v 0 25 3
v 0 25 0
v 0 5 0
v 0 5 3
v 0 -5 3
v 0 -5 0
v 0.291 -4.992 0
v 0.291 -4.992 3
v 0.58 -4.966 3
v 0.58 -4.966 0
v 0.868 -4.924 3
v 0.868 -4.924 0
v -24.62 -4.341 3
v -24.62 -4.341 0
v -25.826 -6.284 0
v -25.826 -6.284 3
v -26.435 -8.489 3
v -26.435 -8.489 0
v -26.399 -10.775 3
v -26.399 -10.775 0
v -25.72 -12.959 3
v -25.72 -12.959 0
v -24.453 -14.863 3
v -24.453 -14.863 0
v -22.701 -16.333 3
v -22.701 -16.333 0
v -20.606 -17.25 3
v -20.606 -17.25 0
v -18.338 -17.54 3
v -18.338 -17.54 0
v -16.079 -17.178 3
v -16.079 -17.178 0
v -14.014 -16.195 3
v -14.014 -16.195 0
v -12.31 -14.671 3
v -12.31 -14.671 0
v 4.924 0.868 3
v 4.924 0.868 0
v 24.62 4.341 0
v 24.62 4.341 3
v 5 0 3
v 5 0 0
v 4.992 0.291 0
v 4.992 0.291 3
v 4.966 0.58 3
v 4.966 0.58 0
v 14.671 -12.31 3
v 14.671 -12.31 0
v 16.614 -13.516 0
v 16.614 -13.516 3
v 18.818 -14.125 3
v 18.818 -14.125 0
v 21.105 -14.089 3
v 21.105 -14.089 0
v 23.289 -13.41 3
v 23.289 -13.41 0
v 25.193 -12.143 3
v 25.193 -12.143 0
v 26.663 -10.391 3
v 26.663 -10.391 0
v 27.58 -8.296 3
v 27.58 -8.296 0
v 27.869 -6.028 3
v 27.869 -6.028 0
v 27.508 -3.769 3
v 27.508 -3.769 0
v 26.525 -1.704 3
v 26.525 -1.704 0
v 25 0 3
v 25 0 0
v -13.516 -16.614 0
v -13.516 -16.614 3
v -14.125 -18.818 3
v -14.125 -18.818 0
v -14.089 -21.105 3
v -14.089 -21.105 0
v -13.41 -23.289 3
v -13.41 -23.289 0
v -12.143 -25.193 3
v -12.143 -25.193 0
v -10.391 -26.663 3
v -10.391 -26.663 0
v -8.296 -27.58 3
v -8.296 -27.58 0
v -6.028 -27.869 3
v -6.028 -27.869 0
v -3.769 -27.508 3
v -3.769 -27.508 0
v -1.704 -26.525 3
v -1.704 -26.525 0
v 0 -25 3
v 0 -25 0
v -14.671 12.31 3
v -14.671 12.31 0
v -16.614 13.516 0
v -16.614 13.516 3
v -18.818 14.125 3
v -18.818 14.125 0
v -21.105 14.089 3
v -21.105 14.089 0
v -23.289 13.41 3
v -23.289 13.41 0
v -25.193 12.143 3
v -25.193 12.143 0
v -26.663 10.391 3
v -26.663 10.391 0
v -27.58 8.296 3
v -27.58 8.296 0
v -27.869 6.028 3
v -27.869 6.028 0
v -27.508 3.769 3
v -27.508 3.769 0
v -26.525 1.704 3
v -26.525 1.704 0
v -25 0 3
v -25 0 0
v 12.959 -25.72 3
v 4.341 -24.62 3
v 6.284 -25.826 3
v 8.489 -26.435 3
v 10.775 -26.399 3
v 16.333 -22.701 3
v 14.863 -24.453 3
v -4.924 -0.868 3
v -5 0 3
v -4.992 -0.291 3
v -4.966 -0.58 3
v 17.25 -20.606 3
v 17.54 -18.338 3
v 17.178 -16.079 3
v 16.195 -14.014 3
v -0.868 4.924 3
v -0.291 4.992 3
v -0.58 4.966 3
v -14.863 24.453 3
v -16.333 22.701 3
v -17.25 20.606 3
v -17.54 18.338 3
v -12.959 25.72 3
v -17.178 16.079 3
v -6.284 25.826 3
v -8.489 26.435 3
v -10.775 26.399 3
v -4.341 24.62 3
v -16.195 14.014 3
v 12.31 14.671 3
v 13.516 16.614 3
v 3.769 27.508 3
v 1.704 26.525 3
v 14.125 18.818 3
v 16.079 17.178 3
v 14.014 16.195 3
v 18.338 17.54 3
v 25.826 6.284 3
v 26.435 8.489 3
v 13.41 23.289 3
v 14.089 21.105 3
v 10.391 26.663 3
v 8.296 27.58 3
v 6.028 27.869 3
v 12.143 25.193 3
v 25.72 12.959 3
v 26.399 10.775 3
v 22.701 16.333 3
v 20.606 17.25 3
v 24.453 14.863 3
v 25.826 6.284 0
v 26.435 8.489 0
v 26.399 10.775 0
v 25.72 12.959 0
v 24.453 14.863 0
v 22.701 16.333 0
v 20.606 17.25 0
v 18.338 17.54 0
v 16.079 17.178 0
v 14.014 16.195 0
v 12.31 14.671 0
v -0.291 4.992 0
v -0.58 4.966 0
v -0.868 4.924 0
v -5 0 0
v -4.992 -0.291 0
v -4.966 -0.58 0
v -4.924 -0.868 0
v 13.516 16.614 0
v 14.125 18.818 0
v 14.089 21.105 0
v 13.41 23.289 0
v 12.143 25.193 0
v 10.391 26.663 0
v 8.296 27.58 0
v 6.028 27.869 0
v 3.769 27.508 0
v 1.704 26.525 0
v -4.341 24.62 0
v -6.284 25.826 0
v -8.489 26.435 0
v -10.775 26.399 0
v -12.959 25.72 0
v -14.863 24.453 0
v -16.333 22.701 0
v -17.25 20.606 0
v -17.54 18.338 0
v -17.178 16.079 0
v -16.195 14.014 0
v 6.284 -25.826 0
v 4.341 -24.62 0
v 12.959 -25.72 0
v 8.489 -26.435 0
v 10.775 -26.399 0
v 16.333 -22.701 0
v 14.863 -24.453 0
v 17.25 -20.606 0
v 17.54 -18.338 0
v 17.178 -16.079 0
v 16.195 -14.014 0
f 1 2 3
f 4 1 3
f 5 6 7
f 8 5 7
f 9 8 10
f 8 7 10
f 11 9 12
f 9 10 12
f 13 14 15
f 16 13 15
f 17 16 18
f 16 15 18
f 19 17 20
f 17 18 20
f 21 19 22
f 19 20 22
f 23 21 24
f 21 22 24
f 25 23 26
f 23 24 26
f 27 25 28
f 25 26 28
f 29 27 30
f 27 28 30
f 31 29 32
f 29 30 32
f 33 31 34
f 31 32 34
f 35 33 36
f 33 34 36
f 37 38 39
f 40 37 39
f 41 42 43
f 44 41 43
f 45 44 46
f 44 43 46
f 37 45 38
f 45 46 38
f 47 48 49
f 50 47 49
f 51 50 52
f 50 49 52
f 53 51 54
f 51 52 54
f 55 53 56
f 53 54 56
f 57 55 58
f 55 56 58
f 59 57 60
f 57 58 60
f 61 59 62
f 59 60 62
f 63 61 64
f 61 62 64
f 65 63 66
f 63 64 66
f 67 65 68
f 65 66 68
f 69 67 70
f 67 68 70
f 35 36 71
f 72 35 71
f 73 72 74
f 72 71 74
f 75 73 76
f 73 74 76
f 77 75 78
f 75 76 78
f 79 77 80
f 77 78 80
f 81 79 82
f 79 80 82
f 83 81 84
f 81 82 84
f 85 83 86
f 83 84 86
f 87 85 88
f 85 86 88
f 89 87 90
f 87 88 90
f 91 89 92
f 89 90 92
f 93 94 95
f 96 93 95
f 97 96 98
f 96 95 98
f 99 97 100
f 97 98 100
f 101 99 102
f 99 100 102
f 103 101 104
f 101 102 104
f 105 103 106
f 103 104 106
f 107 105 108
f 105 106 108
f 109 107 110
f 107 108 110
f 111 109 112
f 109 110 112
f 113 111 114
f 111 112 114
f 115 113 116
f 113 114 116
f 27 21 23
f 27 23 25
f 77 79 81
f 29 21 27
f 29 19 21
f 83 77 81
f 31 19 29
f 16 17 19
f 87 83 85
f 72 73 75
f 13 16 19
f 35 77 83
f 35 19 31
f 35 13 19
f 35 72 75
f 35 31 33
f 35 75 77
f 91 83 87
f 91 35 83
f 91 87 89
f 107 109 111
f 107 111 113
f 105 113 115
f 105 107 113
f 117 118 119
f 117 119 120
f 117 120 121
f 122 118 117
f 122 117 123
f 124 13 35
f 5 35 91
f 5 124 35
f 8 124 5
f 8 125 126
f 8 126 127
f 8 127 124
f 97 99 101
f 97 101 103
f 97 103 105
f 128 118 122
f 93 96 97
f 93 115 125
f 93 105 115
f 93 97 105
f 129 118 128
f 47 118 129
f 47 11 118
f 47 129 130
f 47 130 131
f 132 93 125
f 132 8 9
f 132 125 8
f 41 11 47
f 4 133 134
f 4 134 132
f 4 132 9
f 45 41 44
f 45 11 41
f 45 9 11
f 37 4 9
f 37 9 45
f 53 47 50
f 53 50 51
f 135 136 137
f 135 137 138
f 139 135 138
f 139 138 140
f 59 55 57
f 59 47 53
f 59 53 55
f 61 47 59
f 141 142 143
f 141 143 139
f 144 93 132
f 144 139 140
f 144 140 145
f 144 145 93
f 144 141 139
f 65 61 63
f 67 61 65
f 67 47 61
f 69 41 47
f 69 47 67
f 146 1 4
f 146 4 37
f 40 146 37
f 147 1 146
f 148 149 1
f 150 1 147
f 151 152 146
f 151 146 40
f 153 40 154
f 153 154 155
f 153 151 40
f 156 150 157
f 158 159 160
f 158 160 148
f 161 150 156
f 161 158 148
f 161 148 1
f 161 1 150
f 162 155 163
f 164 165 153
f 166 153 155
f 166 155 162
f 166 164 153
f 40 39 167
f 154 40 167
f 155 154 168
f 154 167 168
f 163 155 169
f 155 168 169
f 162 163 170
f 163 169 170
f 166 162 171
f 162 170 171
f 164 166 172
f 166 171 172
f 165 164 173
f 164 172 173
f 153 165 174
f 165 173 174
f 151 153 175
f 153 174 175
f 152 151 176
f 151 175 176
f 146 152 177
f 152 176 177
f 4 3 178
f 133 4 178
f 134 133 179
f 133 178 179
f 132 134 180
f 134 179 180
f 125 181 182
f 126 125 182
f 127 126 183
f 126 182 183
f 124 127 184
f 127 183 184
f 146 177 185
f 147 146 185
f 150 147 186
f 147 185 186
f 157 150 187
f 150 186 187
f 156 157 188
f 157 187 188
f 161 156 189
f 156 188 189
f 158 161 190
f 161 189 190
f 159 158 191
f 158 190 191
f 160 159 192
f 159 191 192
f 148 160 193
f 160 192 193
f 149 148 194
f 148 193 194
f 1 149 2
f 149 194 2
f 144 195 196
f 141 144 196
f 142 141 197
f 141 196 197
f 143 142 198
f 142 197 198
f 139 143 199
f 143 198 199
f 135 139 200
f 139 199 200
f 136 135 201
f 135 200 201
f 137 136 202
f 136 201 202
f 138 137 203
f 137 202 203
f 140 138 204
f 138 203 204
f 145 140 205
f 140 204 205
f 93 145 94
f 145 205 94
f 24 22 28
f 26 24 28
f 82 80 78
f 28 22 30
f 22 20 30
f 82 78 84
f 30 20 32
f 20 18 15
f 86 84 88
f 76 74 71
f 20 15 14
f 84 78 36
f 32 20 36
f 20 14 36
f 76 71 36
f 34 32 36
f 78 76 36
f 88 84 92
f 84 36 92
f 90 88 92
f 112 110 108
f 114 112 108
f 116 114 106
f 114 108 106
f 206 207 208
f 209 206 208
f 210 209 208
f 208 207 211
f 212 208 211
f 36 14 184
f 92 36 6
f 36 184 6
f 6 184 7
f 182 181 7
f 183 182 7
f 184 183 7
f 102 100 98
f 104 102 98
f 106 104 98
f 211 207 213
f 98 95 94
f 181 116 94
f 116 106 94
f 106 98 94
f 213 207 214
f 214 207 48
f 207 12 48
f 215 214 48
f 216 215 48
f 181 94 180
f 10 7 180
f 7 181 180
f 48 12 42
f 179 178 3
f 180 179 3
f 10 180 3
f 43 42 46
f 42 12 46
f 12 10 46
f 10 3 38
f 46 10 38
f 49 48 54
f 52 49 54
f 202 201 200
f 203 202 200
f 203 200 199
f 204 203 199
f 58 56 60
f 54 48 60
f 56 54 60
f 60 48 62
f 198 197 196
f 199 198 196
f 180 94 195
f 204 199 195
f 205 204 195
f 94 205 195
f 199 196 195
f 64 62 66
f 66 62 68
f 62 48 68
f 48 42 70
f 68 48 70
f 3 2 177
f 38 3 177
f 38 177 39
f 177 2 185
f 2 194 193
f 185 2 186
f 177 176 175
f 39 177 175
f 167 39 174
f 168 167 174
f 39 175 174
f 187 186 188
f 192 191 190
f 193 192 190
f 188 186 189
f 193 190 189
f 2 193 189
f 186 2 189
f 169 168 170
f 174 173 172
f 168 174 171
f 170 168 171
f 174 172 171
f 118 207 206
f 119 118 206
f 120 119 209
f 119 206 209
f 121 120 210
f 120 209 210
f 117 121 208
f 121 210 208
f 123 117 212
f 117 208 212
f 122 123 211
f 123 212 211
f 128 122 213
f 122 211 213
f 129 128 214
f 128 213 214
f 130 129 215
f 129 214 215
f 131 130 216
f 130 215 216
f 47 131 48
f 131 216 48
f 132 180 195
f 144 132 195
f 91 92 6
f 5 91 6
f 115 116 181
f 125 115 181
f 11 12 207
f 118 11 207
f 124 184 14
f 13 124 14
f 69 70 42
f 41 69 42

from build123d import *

# Parameters (mm, degrees)
F1_DEPTH = 3
F2_COUNT = 4
F2_ANGLE = 270
F3_R     = 5
F4_DEPTH = 3


with BuildPart() as f1:
    # F0 (on Top) → F1 (new body)
    with BuildSketch(Plane.XY):
        with BuildLine():
            Line((0, 25), (0, 0))
            Line((0, 0), (24.620194, 4.341204))
            ThreePointArc((24.620194, 4.341204), (23.629844, 15.660952), (12.310097, 14.670602))
            ThreePointArc((12.310097, 14.670602), (11.319747, 25.99035), (0, 25))
        make_face()
    extrude(amount=F1_DEPTH)



with BuildPart() as f2_1:
    # F2: instance of F1
    add(f1.part.rotate(Axis((0, 0, 1.5), (0, 0, 1)), 1 * F2_ANGLE / (F2_COUNT - 1)))


with BuildPart() as f2_2:
    # F2: instance of F1
    add(f1.part.rotate(Axis((0, 0, 1.5), (0, 0, 1)), 2 * F2_ANGLE / (F2_COUNT - 1)))


with BuildPart() as f2_3:
    # F2: instance of F1
    add(f1.part.rotate(Axis((0, 0, 1.5), (0, 0, 1)), 3 * F2_ANGLE / (F2_COUNT - 1)))


with BuildPart() as f1_1:
    add(f1.part)

    add(f2_1.part)  # F4 merges F2_1

    add(f2_2.part)  # F4 merges F2_2

    add(f2_3.part)  # F4 merges F2_3
    # F3 (on Top) → F4 (join)
    with BuildSketch(Plane.XY):
        Circle(F3_R)
    extrude(amount=F4_DEPTH)


solid = f1_1.part
